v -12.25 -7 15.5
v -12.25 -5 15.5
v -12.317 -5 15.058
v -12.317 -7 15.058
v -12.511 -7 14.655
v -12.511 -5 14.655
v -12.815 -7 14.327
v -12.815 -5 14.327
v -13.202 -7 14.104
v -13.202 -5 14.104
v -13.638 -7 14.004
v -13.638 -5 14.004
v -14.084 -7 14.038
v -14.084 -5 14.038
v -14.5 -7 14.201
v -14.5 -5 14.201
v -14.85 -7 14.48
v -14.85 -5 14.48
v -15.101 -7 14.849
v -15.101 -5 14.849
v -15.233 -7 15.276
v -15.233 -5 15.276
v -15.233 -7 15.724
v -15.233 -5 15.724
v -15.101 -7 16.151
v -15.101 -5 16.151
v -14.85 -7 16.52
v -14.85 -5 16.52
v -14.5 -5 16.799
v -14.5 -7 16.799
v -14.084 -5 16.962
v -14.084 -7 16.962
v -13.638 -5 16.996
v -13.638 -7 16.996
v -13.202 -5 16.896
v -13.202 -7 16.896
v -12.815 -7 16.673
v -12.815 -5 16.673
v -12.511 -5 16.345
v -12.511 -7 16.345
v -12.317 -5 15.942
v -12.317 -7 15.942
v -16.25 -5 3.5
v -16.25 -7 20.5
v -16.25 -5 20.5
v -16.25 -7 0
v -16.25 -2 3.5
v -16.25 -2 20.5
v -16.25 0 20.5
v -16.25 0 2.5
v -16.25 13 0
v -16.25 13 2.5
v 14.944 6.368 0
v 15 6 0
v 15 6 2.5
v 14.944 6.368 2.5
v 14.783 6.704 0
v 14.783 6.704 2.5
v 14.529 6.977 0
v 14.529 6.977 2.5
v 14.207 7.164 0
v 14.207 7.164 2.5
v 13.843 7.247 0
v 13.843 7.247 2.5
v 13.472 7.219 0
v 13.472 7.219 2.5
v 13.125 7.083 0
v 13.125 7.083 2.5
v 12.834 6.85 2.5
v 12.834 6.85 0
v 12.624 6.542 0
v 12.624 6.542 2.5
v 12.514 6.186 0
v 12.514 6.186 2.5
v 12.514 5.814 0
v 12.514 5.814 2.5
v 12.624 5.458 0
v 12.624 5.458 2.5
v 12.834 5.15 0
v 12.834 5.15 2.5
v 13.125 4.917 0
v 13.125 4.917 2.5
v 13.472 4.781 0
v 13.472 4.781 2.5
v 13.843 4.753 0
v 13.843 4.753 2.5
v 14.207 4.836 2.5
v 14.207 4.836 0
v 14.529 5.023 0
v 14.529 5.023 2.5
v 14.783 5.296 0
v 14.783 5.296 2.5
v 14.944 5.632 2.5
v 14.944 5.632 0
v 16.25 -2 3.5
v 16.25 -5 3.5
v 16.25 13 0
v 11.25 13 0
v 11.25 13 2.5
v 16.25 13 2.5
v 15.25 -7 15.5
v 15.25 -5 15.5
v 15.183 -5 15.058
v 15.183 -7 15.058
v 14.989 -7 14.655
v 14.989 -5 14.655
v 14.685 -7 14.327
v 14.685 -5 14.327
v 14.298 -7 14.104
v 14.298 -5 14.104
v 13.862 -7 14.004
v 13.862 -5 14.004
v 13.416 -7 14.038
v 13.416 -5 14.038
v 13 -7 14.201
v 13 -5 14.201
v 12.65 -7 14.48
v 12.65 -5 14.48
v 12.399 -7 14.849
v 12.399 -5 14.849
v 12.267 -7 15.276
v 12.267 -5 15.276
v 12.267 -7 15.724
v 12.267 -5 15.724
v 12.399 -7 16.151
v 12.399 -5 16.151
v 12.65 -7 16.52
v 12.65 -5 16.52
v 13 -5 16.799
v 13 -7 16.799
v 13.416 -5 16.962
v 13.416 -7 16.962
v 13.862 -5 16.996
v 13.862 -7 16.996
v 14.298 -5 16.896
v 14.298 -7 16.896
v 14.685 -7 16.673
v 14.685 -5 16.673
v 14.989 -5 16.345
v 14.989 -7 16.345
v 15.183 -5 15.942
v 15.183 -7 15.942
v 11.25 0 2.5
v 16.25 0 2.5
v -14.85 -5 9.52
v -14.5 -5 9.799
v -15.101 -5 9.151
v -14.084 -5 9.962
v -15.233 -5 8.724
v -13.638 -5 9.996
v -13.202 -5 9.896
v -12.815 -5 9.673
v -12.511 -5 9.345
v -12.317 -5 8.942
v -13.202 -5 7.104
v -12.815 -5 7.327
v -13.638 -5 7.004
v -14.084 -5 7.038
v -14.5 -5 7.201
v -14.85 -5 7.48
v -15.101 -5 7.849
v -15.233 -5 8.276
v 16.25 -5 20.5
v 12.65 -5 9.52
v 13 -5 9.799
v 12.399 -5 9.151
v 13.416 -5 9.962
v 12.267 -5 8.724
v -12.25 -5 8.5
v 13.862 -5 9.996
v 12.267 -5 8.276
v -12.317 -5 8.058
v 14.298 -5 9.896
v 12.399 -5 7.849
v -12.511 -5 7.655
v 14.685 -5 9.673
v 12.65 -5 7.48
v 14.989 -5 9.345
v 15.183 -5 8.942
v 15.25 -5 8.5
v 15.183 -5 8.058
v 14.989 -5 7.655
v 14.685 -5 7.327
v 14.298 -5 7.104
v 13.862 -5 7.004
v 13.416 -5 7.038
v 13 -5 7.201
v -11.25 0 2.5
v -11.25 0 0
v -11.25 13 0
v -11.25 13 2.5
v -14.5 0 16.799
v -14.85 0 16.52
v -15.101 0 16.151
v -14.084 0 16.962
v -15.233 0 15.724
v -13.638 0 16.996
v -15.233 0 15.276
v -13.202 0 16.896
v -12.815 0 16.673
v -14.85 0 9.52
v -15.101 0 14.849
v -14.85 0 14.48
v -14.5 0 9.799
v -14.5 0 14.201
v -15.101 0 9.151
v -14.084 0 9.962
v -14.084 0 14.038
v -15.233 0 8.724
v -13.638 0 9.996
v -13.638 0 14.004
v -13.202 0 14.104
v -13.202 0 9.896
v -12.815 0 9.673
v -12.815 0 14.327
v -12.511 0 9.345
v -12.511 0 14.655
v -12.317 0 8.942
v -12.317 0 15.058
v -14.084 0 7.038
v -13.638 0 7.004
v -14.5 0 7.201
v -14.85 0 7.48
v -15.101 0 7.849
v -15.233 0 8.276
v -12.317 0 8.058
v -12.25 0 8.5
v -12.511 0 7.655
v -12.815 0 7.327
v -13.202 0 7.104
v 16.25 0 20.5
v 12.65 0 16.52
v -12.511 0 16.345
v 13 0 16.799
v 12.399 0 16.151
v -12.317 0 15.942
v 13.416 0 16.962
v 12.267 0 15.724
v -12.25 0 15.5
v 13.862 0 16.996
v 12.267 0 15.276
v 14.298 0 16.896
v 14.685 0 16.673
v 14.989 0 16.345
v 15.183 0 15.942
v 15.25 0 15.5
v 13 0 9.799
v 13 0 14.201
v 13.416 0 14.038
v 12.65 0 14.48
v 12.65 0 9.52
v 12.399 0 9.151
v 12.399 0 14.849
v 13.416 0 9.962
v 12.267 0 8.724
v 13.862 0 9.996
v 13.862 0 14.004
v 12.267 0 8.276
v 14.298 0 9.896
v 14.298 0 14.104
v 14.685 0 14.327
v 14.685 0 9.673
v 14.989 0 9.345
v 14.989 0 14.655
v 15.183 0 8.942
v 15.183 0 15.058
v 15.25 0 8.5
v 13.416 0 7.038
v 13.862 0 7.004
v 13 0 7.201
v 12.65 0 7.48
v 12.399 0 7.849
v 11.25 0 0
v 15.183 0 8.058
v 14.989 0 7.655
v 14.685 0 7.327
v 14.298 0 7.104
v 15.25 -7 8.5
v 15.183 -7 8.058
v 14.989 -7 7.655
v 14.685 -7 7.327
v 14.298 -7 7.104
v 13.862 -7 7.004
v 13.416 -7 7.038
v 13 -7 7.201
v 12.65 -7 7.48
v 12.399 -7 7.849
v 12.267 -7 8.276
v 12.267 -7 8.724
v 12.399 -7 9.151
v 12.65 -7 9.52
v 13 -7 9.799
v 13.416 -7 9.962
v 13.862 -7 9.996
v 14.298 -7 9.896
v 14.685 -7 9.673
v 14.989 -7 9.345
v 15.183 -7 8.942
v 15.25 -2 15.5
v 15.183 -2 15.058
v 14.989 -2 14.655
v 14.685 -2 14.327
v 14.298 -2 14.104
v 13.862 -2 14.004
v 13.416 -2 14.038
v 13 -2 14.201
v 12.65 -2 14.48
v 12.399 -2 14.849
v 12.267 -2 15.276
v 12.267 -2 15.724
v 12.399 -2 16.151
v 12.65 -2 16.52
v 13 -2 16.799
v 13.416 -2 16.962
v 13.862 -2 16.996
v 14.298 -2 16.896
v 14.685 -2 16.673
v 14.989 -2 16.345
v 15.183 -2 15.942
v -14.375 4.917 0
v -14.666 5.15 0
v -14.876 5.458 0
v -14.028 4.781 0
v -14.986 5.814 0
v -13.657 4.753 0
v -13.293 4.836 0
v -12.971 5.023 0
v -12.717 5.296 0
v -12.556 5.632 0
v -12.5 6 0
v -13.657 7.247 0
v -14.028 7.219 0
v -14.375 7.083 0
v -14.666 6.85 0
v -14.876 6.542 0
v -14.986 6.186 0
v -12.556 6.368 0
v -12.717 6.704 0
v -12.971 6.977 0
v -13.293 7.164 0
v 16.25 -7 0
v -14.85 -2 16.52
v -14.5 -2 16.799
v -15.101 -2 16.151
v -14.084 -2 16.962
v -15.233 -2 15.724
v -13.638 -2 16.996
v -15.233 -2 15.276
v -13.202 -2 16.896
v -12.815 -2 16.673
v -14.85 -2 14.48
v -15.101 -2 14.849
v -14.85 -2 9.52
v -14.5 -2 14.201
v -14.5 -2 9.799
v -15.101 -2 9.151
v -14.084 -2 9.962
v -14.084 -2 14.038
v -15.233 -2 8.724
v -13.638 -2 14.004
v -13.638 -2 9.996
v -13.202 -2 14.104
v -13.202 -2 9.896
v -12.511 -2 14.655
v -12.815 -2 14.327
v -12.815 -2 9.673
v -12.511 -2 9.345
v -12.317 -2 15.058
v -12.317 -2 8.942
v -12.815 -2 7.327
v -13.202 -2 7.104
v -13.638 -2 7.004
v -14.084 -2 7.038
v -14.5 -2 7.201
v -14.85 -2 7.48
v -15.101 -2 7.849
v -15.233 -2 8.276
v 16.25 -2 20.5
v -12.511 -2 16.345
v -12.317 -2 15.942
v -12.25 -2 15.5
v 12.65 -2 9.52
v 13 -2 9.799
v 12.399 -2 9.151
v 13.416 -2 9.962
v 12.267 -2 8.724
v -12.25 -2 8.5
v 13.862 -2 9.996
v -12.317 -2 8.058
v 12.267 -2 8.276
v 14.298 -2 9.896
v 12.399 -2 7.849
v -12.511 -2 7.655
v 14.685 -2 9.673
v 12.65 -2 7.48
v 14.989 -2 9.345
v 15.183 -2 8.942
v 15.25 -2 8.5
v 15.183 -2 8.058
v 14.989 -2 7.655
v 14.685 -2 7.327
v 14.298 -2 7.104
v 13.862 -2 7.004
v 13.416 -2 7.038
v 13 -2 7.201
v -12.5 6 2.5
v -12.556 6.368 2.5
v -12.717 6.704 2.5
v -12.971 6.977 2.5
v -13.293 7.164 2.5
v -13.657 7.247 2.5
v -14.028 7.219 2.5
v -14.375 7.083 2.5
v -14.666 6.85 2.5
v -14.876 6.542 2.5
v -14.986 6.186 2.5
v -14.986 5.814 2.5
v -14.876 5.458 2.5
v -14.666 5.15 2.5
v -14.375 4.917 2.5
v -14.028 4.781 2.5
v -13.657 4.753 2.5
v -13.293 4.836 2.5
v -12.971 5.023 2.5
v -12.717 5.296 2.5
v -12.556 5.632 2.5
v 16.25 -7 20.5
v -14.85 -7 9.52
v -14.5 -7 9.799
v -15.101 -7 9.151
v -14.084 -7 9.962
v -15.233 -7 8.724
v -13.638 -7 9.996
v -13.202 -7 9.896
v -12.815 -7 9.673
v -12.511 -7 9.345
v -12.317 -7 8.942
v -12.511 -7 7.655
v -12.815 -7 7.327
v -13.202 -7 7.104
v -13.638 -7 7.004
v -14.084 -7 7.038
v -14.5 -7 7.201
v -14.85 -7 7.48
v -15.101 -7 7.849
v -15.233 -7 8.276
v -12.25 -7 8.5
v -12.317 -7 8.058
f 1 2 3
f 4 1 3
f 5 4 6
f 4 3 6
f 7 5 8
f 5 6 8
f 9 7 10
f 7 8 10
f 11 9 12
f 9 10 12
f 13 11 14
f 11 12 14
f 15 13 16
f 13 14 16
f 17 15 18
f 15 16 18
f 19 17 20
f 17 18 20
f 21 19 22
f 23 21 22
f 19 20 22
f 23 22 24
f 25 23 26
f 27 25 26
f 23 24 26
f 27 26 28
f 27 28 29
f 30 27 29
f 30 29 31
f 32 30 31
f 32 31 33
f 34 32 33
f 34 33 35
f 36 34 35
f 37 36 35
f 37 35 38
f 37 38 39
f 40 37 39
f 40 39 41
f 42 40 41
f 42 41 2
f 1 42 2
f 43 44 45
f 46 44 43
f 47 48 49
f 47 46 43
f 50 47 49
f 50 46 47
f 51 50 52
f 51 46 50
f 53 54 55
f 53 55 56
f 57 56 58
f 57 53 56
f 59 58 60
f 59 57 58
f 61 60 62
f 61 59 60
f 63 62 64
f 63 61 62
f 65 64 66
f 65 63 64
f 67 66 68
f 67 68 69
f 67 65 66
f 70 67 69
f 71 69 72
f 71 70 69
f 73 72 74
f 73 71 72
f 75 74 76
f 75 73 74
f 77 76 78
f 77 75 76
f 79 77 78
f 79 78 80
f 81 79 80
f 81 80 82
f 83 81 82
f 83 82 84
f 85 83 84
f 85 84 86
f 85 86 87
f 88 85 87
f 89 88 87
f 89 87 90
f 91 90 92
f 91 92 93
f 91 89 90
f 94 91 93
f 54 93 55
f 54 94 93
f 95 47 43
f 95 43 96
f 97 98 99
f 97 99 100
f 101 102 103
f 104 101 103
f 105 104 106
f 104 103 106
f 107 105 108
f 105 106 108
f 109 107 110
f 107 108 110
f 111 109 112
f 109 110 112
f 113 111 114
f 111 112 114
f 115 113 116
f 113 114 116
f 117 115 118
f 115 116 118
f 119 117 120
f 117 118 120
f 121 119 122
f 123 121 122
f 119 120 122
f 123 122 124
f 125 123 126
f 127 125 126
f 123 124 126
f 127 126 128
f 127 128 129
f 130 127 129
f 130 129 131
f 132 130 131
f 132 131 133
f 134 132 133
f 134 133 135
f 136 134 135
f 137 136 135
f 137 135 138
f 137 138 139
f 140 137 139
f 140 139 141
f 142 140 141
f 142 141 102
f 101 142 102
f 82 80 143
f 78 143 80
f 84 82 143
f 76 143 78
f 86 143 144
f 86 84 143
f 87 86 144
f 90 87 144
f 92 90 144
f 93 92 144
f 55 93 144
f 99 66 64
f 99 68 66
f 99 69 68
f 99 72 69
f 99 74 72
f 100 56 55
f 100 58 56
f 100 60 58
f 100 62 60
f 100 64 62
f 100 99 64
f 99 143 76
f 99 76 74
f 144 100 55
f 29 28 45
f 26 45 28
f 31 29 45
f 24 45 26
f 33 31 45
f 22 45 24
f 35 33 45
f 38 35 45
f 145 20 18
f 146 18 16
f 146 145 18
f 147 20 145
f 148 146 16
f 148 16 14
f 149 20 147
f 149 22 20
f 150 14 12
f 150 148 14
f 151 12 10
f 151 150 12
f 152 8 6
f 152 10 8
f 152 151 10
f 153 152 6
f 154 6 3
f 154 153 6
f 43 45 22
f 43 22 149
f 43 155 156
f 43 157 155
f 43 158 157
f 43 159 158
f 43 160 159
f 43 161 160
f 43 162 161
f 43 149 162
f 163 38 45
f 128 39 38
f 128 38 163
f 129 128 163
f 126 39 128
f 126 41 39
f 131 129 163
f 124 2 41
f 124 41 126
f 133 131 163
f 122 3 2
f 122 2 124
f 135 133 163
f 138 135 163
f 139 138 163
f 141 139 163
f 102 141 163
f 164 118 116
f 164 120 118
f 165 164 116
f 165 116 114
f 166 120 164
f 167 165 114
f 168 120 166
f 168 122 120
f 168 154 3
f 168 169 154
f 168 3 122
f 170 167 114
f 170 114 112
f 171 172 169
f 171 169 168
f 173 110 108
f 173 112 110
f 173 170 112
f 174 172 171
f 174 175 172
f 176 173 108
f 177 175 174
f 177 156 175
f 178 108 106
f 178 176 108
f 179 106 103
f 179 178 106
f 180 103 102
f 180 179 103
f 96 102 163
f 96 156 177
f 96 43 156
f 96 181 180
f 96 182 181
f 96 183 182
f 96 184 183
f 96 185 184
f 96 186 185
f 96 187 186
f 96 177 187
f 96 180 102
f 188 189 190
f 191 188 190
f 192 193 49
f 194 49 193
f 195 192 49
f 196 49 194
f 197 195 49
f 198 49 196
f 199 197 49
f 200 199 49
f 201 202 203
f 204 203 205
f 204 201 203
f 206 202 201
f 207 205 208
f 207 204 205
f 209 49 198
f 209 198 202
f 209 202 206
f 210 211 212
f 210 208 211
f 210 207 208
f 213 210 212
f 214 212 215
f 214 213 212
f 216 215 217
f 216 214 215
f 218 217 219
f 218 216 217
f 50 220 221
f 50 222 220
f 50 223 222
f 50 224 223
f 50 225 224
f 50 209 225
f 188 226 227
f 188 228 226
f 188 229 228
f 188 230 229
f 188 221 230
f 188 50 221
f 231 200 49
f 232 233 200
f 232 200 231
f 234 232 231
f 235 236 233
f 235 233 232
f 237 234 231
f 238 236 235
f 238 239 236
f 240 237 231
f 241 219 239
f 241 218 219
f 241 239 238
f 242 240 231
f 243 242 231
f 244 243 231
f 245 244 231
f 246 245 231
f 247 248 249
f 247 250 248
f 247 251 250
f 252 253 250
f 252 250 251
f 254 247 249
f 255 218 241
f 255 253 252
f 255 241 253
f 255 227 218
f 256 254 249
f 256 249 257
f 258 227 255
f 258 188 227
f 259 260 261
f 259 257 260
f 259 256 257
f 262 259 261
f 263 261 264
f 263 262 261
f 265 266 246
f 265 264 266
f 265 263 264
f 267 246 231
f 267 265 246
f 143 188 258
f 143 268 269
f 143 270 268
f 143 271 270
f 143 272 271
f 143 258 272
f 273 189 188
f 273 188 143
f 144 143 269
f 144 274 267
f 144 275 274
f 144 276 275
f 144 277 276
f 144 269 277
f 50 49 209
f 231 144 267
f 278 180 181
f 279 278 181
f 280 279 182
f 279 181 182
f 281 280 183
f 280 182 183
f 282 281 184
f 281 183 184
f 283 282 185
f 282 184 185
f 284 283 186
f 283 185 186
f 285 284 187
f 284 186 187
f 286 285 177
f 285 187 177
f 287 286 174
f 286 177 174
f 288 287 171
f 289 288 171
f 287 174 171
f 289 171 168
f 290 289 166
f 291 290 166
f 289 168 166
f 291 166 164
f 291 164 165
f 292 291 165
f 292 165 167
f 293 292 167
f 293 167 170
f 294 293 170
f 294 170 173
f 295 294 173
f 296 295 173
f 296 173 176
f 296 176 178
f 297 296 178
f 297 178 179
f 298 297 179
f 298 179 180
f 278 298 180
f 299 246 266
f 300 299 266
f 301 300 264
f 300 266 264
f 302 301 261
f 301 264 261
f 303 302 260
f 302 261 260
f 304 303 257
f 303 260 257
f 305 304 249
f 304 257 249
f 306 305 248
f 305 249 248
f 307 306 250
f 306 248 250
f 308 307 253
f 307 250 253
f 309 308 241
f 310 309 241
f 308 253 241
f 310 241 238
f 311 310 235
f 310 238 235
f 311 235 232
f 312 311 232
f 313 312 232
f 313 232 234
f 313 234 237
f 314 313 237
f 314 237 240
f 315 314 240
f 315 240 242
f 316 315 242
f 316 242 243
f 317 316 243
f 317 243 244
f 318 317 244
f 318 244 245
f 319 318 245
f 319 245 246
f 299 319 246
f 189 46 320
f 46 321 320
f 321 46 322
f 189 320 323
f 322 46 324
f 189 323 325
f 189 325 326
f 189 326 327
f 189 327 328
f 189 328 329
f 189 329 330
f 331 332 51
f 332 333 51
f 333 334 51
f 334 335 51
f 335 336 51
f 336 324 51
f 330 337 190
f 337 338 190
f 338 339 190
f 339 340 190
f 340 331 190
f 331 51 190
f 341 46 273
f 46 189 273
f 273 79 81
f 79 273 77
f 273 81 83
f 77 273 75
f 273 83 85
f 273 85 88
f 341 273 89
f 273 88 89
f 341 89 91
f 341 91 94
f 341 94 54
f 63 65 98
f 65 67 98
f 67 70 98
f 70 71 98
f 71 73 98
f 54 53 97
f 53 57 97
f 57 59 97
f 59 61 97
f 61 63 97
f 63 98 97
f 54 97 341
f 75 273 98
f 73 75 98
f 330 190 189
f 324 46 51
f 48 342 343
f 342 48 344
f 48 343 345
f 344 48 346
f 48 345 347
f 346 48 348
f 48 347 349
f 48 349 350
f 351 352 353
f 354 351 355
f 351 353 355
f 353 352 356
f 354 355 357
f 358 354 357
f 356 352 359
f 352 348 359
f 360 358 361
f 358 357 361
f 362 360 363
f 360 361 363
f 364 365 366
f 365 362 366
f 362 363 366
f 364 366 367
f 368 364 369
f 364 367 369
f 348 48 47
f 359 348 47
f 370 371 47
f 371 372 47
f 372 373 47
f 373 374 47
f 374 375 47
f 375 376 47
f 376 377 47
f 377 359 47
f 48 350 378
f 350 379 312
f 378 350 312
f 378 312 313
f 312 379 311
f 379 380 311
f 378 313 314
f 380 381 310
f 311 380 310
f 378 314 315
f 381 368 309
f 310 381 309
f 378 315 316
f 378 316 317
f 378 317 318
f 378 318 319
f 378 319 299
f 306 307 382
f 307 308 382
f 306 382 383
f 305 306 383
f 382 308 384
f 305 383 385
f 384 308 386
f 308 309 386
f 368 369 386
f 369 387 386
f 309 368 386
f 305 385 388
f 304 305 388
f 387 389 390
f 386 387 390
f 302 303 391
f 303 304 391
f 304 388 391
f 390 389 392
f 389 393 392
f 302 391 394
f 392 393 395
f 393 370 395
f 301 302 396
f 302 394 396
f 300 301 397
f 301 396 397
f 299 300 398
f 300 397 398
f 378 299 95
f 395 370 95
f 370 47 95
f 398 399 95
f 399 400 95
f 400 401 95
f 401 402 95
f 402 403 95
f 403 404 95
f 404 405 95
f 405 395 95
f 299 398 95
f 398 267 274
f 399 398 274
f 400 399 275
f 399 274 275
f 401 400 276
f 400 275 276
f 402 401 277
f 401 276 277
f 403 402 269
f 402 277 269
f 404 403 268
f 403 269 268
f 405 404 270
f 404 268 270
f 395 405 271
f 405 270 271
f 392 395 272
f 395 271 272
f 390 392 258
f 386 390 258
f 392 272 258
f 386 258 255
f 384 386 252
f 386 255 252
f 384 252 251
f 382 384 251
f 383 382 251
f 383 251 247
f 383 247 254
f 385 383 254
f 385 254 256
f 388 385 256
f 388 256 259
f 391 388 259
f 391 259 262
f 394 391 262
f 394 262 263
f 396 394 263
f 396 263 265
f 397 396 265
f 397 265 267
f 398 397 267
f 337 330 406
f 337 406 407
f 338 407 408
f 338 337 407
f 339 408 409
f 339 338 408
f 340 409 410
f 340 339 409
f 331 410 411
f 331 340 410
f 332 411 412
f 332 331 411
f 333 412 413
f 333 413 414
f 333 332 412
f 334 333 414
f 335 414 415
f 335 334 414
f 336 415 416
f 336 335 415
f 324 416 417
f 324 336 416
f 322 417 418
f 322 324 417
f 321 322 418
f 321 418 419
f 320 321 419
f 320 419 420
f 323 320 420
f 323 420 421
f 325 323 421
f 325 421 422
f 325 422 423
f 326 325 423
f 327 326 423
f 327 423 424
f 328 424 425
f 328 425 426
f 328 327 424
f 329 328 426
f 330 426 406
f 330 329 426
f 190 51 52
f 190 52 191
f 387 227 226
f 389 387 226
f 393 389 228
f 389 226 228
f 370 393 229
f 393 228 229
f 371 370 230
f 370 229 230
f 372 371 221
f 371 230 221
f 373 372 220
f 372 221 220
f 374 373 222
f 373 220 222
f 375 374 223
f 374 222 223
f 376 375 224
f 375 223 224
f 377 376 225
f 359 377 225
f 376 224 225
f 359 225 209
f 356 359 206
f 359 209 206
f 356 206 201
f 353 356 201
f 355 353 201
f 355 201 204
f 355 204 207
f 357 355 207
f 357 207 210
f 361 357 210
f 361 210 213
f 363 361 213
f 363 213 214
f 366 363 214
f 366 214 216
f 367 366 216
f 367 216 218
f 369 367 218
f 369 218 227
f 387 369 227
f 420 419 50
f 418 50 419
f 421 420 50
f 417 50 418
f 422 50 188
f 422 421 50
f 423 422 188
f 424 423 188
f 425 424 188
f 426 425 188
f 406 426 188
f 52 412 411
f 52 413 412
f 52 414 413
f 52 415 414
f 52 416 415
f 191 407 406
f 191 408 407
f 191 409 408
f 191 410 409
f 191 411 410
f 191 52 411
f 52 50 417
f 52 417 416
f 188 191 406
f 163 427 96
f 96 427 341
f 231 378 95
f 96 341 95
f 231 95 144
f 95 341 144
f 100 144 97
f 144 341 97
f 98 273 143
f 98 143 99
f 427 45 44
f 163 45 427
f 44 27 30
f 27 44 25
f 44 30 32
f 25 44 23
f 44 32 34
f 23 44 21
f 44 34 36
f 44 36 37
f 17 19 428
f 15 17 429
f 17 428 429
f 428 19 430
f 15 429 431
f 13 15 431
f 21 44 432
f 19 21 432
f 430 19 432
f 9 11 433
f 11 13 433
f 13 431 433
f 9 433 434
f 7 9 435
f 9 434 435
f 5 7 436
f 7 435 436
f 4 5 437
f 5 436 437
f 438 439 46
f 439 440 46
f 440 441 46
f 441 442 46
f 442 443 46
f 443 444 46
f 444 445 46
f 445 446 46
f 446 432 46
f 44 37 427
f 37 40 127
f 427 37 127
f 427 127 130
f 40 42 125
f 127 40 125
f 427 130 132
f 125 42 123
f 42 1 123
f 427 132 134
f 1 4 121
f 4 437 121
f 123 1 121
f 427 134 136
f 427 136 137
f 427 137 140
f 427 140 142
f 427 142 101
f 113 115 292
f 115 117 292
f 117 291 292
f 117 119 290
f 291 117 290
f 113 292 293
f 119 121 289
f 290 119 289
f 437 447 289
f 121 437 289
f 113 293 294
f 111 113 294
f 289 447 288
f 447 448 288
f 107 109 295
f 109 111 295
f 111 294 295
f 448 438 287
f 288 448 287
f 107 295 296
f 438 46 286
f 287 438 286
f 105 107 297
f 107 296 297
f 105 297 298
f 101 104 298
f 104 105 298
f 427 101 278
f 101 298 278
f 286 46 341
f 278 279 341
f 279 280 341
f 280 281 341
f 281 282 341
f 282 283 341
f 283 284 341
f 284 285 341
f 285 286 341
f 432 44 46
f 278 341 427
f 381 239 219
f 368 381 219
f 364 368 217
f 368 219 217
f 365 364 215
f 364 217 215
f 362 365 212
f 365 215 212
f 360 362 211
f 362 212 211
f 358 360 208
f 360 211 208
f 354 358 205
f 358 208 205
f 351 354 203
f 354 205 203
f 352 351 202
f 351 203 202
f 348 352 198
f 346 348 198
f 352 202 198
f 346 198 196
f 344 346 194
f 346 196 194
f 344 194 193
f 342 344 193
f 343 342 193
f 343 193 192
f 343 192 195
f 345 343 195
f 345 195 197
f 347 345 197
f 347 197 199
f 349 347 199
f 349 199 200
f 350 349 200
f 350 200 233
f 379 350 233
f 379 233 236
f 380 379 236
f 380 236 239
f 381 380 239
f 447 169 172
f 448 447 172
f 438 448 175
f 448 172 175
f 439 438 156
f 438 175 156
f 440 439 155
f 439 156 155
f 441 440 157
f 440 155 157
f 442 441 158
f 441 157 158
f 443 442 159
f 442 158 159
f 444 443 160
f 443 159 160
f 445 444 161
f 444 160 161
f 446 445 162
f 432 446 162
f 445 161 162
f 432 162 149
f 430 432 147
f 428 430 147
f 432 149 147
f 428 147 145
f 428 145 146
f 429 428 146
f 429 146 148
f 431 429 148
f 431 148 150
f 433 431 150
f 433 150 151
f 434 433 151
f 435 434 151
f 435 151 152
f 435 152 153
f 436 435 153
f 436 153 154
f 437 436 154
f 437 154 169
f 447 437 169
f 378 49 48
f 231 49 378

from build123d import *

# Parameters (mm, degrees)
SKETCH1_W               = 5
SKETCH1_H               = 13
SKETCH1_R               = 1.25
BOSS_EXTRUDE1_DEPTH     = 2.5
BOSS_EXTRUDE1_2_DEPTH   = 2.5
SKETCH1_5_W             = 32.5
SKETCH1_5_H             = 2
BOSS_EXTRUDE2_DEPTH     = 20.5
SKETCH1_6_W             = 32.5
SKETCH1_6_H             = 3
BOSS_EXTRUDE3_DEPTH     = 3.5
SKETCH2_R               = 1.5
CUT_EXTRUDE2_DEPTH      = 14
CUT_EXTRUDE2_DEPTH_BACK = 8


with BuildPart() as part:
    # Sketch1 → Boss-Extrude1 (new body)
    with BuildSketch(Plane.XY):
        with Locations((-13.75, 6.5)):
            Rectangle(SKETCH1_W, SKETCH1_H)
        with Locations((-13.75, 6)):
            Circle(SKETCH1_R, mode=Mode.SUBTRACT)
    extrude(amount=BOSS_EXTRUDE1_DEPTH)



with BuildPart() as body_2:
    # Sketch1 → Boss-Extrude1 2 (new body)
    with BuildSketch(Plane.XY):
        with Locations((13.75, 6.5)):
            Rectangle(SKETCH1_W, SKETCH1_H)
        with Locations((13.75, 6)):
            Circle(SKETCH1_R, mode=Mode.SUBTRACT)
    extrude(amount=BOSS_EXTRUDE1_2_DEPTH)


with BuildPart() as part_1:
    add(part.part)

    add(body_2.part)  # Boss-Extrude2 merges body 2
    # Sketch1<5> → Boss-Extrude2 (add)
    with BuildSketch(Plane.XY):
        with Locations((0, -1)):
            Rectangle(SKETCH1_5_W, SKETCH1_5_H)
        with Locations((0, -6)):
            Rectangle(SKETCH1_5_W, SKETCH1_5_H)
    extrude(amount=BOSS_EXTRUDE2_DEPTH)

    # Sketch1<6> → Boss-Extrude3 (add)
    with BuildSketch(Plane.XY):
        with Locations((0, -3.5)):
            Rectangle(SKETCH1_6_W, SKETCH1_6_H)
    extrude(amount=BOSS_EXTRUDE3_DEPTH)

    # Sketch2 → Cut-Extrude2 (cut, two sides)
    with BuildSketch(Plane(origin=(0, 0, 0), x_dir=(1, 0, 0), z_dir=(0, 1, 0))) as cut_extrude2_sk:
        with Locations((13.75, -8.5)):
            Circle(SKETCH2_R)
        with Locations((13.75, -15.5)):
            Circle(SKETCH2_R)
        with Locations((-13.75, -15.5)):
            Circle(SKETCH2_R)
        with Locations((-13.75, -8.5)):
            Circle(SKETCH2_R)
    extrude(amount=CUT_EXTRUDE2_DEPTH, mode=Mode.SUBTRACT)
    extrude(cut_extrude2_sk.sketch, amount=-CUT_EXTRUDE2_DEPTH_BACK, mode=Mode.SUBTRACT)


solid = part_1.part
